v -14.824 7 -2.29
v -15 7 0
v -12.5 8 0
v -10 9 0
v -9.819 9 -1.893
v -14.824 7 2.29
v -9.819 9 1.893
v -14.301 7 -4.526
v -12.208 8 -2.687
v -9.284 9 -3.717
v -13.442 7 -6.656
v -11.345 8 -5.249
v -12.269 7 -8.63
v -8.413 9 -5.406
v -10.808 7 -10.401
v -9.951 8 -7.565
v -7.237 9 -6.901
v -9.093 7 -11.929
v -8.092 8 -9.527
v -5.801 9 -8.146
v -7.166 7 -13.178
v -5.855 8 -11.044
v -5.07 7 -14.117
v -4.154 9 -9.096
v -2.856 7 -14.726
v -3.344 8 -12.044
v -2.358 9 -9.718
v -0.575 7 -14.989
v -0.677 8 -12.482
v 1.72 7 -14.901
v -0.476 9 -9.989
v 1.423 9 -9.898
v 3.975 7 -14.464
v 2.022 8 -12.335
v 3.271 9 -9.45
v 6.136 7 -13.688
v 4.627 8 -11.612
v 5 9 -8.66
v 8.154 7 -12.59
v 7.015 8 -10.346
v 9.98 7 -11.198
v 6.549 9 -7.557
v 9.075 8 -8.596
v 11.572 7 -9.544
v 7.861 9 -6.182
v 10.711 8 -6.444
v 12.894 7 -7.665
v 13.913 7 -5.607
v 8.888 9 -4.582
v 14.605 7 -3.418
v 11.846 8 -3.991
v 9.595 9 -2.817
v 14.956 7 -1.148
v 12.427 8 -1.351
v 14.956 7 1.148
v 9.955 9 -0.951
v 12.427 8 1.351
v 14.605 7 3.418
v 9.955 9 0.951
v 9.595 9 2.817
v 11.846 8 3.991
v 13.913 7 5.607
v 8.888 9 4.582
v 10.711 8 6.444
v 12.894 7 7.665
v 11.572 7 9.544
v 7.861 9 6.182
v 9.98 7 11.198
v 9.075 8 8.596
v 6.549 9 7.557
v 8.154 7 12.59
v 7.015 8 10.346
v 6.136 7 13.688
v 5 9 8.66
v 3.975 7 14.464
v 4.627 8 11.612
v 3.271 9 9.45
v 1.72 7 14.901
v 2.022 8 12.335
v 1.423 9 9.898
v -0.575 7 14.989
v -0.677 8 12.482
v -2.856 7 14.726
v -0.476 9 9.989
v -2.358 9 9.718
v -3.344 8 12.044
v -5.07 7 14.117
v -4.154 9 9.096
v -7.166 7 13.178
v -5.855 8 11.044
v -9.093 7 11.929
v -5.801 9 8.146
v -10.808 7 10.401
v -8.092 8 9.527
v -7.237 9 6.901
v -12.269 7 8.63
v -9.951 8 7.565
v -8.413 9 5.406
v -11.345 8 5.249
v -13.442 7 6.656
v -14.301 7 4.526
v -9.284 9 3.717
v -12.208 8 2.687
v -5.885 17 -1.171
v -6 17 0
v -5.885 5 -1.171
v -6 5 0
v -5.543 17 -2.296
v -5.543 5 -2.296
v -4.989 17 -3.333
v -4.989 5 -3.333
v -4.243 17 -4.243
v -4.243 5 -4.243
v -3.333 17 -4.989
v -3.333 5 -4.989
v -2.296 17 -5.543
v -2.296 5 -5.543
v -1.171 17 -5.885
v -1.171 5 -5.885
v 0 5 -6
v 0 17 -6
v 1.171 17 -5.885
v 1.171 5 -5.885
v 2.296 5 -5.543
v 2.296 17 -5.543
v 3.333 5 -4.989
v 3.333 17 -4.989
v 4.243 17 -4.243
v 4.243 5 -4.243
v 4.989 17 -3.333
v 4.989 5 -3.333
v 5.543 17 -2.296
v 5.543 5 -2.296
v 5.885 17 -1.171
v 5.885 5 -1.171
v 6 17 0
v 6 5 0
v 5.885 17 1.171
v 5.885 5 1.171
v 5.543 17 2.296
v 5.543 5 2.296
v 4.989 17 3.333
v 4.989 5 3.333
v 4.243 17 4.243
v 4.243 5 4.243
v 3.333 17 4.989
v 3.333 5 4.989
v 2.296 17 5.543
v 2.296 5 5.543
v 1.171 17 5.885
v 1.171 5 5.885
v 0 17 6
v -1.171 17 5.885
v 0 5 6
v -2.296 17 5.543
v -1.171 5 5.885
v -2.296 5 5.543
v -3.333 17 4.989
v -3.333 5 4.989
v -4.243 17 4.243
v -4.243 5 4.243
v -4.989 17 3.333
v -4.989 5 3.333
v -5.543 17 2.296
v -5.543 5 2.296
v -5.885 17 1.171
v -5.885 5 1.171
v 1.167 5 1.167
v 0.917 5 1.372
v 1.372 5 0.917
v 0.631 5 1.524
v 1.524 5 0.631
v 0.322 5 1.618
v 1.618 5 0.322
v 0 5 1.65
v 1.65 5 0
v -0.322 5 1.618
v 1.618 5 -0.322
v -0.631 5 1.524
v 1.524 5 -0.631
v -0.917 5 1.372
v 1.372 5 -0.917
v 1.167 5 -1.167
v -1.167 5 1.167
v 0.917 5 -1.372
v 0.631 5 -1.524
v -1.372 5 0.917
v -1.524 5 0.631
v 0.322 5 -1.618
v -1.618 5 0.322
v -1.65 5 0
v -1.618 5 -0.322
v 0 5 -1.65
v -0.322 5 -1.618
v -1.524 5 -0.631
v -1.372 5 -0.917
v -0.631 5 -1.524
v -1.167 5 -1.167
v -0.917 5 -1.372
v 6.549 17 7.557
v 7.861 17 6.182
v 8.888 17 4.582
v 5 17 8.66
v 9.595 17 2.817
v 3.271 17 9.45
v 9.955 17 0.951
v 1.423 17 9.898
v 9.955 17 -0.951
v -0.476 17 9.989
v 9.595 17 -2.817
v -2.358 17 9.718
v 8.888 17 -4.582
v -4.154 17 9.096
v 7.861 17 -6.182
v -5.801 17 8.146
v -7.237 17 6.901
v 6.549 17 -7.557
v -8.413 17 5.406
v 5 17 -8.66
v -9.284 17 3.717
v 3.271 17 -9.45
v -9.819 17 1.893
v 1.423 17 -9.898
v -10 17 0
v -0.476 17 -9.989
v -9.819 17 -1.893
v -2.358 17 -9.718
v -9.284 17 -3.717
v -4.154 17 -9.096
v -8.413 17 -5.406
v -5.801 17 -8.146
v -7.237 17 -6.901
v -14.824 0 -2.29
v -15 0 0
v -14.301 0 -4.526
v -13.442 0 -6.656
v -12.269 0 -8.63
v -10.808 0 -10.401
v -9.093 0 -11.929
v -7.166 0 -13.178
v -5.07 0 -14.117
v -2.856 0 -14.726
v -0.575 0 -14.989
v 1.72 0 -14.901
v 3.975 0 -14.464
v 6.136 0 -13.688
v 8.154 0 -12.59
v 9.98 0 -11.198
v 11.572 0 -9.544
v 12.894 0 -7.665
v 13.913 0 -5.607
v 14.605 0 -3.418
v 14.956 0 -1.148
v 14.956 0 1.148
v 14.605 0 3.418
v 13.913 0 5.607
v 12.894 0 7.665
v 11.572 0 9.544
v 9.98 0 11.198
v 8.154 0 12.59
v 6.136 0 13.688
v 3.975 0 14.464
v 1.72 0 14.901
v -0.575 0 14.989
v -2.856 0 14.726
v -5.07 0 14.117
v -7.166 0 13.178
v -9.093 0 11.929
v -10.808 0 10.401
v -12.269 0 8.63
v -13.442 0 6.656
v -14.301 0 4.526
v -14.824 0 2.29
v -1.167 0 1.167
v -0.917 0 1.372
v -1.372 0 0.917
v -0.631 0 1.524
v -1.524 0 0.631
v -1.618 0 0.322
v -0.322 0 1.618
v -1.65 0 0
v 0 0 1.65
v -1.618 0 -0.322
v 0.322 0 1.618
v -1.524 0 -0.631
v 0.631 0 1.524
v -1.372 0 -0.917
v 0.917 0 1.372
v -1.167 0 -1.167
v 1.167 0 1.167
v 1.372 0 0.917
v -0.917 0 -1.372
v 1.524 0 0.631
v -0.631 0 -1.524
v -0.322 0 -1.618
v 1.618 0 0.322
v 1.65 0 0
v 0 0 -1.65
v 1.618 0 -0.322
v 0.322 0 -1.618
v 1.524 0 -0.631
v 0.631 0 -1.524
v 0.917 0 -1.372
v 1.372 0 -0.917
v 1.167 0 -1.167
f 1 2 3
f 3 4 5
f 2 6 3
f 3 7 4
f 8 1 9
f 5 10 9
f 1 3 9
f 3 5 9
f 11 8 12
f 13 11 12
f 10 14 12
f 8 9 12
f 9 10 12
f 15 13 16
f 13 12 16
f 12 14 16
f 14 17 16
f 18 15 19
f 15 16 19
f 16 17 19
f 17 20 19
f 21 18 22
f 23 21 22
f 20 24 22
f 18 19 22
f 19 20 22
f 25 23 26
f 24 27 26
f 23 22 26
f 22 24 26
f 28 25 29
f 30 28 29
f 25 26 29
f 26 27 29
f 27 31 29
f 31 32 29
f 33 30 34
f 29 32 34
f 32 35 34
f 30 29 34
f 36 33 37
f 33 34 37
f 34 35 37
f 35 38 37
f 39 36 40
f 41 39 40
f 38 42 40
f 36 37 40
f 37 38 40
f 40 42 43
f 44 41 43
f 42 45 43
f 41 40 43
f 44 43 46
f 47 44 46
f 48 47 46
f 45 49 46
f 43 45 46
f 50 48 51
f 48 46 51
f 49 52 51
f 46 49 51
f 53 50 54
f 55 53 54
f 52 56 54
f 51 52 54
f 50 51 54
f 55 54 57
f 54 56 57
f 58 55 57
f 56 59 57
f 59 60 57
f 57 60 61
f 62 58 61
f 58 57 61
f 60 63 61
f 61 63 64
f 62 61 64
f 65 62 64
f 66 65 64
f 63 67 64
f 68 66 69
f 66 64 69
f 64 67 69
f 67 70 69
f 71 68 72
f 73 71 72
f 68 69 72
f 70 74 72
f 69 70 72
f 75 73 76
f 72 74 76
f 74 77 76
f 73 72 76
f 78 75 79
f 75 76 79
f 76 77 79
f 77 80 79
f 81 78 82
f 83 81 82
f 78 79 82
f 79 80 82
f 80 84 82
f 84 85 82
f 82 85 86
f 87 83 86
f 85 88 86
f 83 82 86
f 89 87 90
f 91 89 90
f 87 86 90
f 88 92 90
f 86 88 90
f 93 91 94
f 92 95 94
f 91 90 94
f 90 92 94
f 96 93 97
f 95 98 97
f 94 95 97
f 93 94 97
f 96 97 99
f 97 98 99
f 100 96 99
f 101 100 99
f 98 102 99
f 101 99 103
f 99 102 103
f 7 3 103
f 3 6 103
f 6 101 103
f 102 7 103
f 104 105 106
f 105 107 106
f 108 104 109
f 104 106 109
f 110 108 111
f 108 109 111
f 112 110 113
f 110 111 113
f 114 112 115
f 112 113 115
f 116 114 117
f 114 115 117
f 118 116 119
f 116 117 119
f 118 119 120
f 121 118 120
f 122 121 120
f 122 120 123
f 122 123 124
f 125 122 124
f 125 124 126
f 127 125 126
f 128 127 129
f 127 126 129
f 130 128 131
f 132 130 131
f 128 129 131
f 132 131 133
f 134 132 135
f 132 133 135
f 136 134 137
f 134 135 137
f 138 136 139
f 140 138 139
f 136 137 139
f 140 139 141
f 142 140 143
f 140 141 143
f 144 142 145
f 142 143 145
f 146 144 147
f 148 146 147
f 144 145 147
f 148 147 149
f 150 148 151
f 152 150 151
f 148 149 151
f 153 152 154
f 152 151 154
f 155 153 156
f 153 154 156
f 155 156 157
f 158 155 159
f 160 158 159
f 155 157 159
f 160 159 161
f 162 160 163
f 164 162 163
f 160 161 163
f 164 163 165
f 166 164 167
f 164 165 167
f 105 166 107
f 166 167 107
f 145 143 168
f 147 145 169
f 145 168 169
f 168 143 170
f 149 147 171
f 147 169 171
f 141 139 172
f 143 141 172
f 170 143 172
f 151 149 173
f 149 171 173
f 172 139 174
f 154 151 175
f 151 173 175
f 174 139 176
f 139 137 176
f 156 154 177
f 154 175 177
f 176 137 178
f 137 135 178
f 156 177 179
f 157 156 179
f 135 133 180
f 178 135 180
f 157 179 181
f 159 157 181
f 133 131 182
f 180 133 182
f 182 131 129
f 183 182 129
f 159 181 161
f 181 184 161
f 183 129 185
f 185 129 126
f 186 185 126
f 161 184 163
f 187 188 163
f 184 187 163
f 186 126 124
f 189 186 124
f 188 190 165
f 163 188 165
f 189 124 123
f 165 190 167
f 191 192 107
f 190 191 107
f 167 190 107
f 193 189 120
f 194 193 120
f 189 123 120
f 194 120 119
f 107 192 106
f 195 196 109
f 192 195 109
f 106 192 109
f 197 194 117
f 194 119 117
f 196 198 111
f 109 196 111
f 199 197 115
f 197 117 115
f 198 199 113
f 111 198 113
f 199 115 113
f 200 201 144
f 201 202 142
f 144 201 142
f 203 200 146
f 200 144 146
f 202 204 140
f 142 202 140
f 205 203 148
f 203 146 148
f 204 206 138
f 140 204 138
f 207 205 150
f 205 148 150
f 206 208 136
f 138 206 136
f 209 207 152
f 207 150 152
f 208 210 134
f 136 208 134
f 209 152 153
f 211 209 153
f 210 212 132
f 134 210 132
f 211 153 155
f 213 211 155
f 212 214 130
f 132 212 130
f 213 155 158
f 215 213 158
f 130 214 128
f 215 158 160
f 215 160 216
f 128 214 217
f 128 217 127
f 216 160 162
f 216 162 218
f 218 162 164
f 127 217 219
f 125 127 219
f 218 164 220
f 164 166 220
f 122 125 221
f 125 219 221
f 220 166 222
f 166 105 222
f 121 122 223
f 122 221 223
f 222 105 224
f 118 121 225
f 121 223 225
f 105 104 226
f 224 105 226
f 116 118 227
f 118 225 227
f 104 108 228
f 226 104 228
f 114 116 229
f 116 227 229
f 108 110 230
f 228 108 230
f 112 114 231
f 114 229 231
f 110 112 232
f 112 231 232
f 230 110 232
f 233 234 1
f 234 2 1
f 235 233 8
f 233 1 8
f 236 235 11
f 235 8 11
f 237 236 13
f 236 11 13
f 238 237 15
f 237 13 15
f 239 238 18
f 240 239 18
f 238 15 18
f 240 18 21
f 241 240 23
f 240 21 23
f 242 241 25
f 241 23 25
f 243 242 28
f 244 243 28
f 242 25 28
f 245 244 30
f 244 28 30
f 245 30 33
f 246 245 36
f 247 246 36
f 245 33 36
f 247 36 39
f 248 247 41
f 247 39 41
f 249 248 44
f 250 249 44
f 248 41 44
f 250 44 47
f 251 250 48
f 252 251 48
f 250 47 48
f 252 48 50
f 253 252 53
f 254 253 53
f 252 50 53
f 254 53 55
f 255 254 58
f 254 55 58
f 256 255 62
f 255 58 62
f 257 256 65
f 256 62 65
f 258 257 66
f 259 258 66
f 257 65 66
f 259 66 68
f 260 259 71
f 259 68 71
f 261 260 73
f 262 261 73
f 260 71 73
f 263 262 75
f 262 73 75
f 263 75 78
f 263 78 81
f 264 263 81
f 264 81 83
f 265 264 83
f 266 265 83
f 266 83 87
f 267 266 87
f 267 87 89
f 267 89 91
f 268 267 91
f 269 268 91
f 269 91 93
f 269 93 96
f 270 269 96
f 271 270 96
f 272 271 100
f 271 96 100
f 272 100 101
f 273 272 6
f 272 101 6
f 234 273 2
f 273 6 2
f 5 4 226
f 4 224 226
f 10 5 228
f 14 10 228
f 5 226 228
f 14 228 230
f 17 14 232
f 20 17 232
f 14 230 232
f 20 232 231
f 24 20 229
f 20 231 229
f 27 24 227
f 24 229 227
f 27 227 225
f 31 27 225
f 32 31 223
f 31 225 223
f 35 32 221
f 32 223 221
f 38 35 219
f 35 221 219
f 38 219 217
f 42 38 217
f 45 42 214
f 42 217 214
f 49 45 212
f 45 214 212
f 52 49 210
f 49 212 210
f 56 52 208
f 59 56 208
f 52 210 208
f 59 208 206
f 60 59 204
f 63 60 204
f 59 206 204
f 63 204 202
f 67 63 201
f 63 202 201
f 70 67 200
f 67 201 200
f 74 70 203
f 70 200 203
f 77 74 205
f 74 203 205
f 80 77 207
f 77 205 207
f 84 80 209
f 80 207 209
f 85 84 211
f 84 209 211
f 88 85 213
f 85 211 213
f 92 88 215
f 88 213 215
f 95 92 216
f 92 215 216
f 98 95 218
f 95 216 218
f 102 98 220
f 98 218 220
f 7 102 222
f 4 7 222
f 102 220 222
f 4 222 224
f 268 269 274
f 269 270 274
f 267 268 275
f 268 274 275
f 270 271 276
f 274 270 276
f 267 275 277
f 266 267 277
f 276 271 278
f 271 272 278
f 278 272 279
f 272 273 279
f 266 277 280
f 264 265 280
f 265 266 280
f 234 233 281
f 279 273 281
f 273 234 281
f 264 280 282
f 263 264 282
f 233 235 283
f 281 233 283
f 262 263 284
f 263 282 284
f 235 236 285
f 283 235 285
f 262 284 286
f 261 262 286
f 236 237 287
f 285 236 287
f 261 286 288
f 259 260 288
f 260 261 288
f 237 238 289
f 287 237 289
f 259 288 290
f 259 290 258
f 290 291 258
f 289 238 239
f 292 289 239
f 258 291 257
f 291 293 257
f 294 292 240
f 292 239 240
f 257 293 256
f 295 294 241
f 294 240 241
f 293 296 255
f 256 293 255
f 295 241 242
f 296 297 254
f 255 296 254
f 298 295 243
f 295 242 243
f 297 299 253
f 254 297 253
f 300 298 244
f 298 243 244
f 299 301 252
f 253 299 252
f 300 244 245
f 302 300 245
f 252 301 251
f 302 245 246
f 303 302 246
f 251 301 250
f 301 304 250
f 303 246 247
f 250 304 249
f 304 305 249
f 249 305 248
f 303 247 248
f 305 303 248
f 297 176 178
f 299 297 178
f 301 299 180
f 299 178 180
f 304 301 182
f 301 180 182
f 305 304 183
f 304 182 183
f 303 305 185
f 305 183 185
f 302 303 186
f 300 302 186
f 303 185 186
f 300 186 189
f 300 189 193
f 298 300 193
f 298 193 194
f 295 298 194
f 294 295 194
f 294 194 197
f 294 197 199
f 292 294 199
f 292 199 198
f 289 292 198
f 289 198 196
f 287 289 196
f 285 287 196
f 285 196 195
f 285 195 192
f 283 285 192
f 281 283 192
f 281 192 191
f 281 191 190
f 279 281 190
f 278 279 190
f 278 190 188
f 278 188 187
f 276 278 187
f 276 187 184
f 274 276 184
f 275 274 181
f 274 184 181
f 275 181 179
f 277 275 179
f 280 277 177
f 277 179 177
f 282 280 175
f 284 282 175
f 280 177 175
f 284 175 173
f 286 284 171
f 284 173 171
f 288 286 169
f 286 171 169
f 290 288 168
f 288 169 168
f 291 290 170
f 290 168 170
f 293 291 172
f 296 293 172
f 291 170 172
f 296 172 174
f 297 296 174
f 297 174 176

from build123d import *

# Parameters (mm, degrees)
M4_TAPPED_HOLE1_D     = 3.3
M4_TAPPED_HOLE1_DEPTH = 10.508579979
M4_TAPPED_HOLE1_TIP   = 0.991420021


with BuildPart() as part:
    # Sketch1 → Revolve1 (revolve)
    with BuildSketch(Plane.XY, mode=Mode.PRIVATE) as revolve1_sk:
        Polygon((0, 0), (15, 0), (15, 7), (10, 9), (10, 17), (6, 17), (6, 5), (0, 5), align=None)
    revolve(revolve1_sk.sketch.rotate(Axis((0, 5, 0), (0, -1, 0)), 180), axis=Axis((0, 5, 0), (0, -1, 0)))

    # M4 Tapped Hole1
    with Locations(Plane(origin=(0, 0, 0), x_dir=(-1, 0, 0), z_dir=(0, -1, 0))):
        with Locations((0, 0)):
            Hole(M4_TAPPED_HOLE1_D / 2, depth=M4_TAPPED_HOLE1_DEPTH)
            with Locations((0, 0, -(M4_TAPPED_HOLE1_DEPTH + M4_TAPPED_HOLE1_TIP / 2))):  # 118° drill point
                Cone(0, M4_TAPPED_HOLE1_D / 2, M4_TAPPED_HOLE1_TIP, mode=Mode.SUBTRACT)


solid = part.part
